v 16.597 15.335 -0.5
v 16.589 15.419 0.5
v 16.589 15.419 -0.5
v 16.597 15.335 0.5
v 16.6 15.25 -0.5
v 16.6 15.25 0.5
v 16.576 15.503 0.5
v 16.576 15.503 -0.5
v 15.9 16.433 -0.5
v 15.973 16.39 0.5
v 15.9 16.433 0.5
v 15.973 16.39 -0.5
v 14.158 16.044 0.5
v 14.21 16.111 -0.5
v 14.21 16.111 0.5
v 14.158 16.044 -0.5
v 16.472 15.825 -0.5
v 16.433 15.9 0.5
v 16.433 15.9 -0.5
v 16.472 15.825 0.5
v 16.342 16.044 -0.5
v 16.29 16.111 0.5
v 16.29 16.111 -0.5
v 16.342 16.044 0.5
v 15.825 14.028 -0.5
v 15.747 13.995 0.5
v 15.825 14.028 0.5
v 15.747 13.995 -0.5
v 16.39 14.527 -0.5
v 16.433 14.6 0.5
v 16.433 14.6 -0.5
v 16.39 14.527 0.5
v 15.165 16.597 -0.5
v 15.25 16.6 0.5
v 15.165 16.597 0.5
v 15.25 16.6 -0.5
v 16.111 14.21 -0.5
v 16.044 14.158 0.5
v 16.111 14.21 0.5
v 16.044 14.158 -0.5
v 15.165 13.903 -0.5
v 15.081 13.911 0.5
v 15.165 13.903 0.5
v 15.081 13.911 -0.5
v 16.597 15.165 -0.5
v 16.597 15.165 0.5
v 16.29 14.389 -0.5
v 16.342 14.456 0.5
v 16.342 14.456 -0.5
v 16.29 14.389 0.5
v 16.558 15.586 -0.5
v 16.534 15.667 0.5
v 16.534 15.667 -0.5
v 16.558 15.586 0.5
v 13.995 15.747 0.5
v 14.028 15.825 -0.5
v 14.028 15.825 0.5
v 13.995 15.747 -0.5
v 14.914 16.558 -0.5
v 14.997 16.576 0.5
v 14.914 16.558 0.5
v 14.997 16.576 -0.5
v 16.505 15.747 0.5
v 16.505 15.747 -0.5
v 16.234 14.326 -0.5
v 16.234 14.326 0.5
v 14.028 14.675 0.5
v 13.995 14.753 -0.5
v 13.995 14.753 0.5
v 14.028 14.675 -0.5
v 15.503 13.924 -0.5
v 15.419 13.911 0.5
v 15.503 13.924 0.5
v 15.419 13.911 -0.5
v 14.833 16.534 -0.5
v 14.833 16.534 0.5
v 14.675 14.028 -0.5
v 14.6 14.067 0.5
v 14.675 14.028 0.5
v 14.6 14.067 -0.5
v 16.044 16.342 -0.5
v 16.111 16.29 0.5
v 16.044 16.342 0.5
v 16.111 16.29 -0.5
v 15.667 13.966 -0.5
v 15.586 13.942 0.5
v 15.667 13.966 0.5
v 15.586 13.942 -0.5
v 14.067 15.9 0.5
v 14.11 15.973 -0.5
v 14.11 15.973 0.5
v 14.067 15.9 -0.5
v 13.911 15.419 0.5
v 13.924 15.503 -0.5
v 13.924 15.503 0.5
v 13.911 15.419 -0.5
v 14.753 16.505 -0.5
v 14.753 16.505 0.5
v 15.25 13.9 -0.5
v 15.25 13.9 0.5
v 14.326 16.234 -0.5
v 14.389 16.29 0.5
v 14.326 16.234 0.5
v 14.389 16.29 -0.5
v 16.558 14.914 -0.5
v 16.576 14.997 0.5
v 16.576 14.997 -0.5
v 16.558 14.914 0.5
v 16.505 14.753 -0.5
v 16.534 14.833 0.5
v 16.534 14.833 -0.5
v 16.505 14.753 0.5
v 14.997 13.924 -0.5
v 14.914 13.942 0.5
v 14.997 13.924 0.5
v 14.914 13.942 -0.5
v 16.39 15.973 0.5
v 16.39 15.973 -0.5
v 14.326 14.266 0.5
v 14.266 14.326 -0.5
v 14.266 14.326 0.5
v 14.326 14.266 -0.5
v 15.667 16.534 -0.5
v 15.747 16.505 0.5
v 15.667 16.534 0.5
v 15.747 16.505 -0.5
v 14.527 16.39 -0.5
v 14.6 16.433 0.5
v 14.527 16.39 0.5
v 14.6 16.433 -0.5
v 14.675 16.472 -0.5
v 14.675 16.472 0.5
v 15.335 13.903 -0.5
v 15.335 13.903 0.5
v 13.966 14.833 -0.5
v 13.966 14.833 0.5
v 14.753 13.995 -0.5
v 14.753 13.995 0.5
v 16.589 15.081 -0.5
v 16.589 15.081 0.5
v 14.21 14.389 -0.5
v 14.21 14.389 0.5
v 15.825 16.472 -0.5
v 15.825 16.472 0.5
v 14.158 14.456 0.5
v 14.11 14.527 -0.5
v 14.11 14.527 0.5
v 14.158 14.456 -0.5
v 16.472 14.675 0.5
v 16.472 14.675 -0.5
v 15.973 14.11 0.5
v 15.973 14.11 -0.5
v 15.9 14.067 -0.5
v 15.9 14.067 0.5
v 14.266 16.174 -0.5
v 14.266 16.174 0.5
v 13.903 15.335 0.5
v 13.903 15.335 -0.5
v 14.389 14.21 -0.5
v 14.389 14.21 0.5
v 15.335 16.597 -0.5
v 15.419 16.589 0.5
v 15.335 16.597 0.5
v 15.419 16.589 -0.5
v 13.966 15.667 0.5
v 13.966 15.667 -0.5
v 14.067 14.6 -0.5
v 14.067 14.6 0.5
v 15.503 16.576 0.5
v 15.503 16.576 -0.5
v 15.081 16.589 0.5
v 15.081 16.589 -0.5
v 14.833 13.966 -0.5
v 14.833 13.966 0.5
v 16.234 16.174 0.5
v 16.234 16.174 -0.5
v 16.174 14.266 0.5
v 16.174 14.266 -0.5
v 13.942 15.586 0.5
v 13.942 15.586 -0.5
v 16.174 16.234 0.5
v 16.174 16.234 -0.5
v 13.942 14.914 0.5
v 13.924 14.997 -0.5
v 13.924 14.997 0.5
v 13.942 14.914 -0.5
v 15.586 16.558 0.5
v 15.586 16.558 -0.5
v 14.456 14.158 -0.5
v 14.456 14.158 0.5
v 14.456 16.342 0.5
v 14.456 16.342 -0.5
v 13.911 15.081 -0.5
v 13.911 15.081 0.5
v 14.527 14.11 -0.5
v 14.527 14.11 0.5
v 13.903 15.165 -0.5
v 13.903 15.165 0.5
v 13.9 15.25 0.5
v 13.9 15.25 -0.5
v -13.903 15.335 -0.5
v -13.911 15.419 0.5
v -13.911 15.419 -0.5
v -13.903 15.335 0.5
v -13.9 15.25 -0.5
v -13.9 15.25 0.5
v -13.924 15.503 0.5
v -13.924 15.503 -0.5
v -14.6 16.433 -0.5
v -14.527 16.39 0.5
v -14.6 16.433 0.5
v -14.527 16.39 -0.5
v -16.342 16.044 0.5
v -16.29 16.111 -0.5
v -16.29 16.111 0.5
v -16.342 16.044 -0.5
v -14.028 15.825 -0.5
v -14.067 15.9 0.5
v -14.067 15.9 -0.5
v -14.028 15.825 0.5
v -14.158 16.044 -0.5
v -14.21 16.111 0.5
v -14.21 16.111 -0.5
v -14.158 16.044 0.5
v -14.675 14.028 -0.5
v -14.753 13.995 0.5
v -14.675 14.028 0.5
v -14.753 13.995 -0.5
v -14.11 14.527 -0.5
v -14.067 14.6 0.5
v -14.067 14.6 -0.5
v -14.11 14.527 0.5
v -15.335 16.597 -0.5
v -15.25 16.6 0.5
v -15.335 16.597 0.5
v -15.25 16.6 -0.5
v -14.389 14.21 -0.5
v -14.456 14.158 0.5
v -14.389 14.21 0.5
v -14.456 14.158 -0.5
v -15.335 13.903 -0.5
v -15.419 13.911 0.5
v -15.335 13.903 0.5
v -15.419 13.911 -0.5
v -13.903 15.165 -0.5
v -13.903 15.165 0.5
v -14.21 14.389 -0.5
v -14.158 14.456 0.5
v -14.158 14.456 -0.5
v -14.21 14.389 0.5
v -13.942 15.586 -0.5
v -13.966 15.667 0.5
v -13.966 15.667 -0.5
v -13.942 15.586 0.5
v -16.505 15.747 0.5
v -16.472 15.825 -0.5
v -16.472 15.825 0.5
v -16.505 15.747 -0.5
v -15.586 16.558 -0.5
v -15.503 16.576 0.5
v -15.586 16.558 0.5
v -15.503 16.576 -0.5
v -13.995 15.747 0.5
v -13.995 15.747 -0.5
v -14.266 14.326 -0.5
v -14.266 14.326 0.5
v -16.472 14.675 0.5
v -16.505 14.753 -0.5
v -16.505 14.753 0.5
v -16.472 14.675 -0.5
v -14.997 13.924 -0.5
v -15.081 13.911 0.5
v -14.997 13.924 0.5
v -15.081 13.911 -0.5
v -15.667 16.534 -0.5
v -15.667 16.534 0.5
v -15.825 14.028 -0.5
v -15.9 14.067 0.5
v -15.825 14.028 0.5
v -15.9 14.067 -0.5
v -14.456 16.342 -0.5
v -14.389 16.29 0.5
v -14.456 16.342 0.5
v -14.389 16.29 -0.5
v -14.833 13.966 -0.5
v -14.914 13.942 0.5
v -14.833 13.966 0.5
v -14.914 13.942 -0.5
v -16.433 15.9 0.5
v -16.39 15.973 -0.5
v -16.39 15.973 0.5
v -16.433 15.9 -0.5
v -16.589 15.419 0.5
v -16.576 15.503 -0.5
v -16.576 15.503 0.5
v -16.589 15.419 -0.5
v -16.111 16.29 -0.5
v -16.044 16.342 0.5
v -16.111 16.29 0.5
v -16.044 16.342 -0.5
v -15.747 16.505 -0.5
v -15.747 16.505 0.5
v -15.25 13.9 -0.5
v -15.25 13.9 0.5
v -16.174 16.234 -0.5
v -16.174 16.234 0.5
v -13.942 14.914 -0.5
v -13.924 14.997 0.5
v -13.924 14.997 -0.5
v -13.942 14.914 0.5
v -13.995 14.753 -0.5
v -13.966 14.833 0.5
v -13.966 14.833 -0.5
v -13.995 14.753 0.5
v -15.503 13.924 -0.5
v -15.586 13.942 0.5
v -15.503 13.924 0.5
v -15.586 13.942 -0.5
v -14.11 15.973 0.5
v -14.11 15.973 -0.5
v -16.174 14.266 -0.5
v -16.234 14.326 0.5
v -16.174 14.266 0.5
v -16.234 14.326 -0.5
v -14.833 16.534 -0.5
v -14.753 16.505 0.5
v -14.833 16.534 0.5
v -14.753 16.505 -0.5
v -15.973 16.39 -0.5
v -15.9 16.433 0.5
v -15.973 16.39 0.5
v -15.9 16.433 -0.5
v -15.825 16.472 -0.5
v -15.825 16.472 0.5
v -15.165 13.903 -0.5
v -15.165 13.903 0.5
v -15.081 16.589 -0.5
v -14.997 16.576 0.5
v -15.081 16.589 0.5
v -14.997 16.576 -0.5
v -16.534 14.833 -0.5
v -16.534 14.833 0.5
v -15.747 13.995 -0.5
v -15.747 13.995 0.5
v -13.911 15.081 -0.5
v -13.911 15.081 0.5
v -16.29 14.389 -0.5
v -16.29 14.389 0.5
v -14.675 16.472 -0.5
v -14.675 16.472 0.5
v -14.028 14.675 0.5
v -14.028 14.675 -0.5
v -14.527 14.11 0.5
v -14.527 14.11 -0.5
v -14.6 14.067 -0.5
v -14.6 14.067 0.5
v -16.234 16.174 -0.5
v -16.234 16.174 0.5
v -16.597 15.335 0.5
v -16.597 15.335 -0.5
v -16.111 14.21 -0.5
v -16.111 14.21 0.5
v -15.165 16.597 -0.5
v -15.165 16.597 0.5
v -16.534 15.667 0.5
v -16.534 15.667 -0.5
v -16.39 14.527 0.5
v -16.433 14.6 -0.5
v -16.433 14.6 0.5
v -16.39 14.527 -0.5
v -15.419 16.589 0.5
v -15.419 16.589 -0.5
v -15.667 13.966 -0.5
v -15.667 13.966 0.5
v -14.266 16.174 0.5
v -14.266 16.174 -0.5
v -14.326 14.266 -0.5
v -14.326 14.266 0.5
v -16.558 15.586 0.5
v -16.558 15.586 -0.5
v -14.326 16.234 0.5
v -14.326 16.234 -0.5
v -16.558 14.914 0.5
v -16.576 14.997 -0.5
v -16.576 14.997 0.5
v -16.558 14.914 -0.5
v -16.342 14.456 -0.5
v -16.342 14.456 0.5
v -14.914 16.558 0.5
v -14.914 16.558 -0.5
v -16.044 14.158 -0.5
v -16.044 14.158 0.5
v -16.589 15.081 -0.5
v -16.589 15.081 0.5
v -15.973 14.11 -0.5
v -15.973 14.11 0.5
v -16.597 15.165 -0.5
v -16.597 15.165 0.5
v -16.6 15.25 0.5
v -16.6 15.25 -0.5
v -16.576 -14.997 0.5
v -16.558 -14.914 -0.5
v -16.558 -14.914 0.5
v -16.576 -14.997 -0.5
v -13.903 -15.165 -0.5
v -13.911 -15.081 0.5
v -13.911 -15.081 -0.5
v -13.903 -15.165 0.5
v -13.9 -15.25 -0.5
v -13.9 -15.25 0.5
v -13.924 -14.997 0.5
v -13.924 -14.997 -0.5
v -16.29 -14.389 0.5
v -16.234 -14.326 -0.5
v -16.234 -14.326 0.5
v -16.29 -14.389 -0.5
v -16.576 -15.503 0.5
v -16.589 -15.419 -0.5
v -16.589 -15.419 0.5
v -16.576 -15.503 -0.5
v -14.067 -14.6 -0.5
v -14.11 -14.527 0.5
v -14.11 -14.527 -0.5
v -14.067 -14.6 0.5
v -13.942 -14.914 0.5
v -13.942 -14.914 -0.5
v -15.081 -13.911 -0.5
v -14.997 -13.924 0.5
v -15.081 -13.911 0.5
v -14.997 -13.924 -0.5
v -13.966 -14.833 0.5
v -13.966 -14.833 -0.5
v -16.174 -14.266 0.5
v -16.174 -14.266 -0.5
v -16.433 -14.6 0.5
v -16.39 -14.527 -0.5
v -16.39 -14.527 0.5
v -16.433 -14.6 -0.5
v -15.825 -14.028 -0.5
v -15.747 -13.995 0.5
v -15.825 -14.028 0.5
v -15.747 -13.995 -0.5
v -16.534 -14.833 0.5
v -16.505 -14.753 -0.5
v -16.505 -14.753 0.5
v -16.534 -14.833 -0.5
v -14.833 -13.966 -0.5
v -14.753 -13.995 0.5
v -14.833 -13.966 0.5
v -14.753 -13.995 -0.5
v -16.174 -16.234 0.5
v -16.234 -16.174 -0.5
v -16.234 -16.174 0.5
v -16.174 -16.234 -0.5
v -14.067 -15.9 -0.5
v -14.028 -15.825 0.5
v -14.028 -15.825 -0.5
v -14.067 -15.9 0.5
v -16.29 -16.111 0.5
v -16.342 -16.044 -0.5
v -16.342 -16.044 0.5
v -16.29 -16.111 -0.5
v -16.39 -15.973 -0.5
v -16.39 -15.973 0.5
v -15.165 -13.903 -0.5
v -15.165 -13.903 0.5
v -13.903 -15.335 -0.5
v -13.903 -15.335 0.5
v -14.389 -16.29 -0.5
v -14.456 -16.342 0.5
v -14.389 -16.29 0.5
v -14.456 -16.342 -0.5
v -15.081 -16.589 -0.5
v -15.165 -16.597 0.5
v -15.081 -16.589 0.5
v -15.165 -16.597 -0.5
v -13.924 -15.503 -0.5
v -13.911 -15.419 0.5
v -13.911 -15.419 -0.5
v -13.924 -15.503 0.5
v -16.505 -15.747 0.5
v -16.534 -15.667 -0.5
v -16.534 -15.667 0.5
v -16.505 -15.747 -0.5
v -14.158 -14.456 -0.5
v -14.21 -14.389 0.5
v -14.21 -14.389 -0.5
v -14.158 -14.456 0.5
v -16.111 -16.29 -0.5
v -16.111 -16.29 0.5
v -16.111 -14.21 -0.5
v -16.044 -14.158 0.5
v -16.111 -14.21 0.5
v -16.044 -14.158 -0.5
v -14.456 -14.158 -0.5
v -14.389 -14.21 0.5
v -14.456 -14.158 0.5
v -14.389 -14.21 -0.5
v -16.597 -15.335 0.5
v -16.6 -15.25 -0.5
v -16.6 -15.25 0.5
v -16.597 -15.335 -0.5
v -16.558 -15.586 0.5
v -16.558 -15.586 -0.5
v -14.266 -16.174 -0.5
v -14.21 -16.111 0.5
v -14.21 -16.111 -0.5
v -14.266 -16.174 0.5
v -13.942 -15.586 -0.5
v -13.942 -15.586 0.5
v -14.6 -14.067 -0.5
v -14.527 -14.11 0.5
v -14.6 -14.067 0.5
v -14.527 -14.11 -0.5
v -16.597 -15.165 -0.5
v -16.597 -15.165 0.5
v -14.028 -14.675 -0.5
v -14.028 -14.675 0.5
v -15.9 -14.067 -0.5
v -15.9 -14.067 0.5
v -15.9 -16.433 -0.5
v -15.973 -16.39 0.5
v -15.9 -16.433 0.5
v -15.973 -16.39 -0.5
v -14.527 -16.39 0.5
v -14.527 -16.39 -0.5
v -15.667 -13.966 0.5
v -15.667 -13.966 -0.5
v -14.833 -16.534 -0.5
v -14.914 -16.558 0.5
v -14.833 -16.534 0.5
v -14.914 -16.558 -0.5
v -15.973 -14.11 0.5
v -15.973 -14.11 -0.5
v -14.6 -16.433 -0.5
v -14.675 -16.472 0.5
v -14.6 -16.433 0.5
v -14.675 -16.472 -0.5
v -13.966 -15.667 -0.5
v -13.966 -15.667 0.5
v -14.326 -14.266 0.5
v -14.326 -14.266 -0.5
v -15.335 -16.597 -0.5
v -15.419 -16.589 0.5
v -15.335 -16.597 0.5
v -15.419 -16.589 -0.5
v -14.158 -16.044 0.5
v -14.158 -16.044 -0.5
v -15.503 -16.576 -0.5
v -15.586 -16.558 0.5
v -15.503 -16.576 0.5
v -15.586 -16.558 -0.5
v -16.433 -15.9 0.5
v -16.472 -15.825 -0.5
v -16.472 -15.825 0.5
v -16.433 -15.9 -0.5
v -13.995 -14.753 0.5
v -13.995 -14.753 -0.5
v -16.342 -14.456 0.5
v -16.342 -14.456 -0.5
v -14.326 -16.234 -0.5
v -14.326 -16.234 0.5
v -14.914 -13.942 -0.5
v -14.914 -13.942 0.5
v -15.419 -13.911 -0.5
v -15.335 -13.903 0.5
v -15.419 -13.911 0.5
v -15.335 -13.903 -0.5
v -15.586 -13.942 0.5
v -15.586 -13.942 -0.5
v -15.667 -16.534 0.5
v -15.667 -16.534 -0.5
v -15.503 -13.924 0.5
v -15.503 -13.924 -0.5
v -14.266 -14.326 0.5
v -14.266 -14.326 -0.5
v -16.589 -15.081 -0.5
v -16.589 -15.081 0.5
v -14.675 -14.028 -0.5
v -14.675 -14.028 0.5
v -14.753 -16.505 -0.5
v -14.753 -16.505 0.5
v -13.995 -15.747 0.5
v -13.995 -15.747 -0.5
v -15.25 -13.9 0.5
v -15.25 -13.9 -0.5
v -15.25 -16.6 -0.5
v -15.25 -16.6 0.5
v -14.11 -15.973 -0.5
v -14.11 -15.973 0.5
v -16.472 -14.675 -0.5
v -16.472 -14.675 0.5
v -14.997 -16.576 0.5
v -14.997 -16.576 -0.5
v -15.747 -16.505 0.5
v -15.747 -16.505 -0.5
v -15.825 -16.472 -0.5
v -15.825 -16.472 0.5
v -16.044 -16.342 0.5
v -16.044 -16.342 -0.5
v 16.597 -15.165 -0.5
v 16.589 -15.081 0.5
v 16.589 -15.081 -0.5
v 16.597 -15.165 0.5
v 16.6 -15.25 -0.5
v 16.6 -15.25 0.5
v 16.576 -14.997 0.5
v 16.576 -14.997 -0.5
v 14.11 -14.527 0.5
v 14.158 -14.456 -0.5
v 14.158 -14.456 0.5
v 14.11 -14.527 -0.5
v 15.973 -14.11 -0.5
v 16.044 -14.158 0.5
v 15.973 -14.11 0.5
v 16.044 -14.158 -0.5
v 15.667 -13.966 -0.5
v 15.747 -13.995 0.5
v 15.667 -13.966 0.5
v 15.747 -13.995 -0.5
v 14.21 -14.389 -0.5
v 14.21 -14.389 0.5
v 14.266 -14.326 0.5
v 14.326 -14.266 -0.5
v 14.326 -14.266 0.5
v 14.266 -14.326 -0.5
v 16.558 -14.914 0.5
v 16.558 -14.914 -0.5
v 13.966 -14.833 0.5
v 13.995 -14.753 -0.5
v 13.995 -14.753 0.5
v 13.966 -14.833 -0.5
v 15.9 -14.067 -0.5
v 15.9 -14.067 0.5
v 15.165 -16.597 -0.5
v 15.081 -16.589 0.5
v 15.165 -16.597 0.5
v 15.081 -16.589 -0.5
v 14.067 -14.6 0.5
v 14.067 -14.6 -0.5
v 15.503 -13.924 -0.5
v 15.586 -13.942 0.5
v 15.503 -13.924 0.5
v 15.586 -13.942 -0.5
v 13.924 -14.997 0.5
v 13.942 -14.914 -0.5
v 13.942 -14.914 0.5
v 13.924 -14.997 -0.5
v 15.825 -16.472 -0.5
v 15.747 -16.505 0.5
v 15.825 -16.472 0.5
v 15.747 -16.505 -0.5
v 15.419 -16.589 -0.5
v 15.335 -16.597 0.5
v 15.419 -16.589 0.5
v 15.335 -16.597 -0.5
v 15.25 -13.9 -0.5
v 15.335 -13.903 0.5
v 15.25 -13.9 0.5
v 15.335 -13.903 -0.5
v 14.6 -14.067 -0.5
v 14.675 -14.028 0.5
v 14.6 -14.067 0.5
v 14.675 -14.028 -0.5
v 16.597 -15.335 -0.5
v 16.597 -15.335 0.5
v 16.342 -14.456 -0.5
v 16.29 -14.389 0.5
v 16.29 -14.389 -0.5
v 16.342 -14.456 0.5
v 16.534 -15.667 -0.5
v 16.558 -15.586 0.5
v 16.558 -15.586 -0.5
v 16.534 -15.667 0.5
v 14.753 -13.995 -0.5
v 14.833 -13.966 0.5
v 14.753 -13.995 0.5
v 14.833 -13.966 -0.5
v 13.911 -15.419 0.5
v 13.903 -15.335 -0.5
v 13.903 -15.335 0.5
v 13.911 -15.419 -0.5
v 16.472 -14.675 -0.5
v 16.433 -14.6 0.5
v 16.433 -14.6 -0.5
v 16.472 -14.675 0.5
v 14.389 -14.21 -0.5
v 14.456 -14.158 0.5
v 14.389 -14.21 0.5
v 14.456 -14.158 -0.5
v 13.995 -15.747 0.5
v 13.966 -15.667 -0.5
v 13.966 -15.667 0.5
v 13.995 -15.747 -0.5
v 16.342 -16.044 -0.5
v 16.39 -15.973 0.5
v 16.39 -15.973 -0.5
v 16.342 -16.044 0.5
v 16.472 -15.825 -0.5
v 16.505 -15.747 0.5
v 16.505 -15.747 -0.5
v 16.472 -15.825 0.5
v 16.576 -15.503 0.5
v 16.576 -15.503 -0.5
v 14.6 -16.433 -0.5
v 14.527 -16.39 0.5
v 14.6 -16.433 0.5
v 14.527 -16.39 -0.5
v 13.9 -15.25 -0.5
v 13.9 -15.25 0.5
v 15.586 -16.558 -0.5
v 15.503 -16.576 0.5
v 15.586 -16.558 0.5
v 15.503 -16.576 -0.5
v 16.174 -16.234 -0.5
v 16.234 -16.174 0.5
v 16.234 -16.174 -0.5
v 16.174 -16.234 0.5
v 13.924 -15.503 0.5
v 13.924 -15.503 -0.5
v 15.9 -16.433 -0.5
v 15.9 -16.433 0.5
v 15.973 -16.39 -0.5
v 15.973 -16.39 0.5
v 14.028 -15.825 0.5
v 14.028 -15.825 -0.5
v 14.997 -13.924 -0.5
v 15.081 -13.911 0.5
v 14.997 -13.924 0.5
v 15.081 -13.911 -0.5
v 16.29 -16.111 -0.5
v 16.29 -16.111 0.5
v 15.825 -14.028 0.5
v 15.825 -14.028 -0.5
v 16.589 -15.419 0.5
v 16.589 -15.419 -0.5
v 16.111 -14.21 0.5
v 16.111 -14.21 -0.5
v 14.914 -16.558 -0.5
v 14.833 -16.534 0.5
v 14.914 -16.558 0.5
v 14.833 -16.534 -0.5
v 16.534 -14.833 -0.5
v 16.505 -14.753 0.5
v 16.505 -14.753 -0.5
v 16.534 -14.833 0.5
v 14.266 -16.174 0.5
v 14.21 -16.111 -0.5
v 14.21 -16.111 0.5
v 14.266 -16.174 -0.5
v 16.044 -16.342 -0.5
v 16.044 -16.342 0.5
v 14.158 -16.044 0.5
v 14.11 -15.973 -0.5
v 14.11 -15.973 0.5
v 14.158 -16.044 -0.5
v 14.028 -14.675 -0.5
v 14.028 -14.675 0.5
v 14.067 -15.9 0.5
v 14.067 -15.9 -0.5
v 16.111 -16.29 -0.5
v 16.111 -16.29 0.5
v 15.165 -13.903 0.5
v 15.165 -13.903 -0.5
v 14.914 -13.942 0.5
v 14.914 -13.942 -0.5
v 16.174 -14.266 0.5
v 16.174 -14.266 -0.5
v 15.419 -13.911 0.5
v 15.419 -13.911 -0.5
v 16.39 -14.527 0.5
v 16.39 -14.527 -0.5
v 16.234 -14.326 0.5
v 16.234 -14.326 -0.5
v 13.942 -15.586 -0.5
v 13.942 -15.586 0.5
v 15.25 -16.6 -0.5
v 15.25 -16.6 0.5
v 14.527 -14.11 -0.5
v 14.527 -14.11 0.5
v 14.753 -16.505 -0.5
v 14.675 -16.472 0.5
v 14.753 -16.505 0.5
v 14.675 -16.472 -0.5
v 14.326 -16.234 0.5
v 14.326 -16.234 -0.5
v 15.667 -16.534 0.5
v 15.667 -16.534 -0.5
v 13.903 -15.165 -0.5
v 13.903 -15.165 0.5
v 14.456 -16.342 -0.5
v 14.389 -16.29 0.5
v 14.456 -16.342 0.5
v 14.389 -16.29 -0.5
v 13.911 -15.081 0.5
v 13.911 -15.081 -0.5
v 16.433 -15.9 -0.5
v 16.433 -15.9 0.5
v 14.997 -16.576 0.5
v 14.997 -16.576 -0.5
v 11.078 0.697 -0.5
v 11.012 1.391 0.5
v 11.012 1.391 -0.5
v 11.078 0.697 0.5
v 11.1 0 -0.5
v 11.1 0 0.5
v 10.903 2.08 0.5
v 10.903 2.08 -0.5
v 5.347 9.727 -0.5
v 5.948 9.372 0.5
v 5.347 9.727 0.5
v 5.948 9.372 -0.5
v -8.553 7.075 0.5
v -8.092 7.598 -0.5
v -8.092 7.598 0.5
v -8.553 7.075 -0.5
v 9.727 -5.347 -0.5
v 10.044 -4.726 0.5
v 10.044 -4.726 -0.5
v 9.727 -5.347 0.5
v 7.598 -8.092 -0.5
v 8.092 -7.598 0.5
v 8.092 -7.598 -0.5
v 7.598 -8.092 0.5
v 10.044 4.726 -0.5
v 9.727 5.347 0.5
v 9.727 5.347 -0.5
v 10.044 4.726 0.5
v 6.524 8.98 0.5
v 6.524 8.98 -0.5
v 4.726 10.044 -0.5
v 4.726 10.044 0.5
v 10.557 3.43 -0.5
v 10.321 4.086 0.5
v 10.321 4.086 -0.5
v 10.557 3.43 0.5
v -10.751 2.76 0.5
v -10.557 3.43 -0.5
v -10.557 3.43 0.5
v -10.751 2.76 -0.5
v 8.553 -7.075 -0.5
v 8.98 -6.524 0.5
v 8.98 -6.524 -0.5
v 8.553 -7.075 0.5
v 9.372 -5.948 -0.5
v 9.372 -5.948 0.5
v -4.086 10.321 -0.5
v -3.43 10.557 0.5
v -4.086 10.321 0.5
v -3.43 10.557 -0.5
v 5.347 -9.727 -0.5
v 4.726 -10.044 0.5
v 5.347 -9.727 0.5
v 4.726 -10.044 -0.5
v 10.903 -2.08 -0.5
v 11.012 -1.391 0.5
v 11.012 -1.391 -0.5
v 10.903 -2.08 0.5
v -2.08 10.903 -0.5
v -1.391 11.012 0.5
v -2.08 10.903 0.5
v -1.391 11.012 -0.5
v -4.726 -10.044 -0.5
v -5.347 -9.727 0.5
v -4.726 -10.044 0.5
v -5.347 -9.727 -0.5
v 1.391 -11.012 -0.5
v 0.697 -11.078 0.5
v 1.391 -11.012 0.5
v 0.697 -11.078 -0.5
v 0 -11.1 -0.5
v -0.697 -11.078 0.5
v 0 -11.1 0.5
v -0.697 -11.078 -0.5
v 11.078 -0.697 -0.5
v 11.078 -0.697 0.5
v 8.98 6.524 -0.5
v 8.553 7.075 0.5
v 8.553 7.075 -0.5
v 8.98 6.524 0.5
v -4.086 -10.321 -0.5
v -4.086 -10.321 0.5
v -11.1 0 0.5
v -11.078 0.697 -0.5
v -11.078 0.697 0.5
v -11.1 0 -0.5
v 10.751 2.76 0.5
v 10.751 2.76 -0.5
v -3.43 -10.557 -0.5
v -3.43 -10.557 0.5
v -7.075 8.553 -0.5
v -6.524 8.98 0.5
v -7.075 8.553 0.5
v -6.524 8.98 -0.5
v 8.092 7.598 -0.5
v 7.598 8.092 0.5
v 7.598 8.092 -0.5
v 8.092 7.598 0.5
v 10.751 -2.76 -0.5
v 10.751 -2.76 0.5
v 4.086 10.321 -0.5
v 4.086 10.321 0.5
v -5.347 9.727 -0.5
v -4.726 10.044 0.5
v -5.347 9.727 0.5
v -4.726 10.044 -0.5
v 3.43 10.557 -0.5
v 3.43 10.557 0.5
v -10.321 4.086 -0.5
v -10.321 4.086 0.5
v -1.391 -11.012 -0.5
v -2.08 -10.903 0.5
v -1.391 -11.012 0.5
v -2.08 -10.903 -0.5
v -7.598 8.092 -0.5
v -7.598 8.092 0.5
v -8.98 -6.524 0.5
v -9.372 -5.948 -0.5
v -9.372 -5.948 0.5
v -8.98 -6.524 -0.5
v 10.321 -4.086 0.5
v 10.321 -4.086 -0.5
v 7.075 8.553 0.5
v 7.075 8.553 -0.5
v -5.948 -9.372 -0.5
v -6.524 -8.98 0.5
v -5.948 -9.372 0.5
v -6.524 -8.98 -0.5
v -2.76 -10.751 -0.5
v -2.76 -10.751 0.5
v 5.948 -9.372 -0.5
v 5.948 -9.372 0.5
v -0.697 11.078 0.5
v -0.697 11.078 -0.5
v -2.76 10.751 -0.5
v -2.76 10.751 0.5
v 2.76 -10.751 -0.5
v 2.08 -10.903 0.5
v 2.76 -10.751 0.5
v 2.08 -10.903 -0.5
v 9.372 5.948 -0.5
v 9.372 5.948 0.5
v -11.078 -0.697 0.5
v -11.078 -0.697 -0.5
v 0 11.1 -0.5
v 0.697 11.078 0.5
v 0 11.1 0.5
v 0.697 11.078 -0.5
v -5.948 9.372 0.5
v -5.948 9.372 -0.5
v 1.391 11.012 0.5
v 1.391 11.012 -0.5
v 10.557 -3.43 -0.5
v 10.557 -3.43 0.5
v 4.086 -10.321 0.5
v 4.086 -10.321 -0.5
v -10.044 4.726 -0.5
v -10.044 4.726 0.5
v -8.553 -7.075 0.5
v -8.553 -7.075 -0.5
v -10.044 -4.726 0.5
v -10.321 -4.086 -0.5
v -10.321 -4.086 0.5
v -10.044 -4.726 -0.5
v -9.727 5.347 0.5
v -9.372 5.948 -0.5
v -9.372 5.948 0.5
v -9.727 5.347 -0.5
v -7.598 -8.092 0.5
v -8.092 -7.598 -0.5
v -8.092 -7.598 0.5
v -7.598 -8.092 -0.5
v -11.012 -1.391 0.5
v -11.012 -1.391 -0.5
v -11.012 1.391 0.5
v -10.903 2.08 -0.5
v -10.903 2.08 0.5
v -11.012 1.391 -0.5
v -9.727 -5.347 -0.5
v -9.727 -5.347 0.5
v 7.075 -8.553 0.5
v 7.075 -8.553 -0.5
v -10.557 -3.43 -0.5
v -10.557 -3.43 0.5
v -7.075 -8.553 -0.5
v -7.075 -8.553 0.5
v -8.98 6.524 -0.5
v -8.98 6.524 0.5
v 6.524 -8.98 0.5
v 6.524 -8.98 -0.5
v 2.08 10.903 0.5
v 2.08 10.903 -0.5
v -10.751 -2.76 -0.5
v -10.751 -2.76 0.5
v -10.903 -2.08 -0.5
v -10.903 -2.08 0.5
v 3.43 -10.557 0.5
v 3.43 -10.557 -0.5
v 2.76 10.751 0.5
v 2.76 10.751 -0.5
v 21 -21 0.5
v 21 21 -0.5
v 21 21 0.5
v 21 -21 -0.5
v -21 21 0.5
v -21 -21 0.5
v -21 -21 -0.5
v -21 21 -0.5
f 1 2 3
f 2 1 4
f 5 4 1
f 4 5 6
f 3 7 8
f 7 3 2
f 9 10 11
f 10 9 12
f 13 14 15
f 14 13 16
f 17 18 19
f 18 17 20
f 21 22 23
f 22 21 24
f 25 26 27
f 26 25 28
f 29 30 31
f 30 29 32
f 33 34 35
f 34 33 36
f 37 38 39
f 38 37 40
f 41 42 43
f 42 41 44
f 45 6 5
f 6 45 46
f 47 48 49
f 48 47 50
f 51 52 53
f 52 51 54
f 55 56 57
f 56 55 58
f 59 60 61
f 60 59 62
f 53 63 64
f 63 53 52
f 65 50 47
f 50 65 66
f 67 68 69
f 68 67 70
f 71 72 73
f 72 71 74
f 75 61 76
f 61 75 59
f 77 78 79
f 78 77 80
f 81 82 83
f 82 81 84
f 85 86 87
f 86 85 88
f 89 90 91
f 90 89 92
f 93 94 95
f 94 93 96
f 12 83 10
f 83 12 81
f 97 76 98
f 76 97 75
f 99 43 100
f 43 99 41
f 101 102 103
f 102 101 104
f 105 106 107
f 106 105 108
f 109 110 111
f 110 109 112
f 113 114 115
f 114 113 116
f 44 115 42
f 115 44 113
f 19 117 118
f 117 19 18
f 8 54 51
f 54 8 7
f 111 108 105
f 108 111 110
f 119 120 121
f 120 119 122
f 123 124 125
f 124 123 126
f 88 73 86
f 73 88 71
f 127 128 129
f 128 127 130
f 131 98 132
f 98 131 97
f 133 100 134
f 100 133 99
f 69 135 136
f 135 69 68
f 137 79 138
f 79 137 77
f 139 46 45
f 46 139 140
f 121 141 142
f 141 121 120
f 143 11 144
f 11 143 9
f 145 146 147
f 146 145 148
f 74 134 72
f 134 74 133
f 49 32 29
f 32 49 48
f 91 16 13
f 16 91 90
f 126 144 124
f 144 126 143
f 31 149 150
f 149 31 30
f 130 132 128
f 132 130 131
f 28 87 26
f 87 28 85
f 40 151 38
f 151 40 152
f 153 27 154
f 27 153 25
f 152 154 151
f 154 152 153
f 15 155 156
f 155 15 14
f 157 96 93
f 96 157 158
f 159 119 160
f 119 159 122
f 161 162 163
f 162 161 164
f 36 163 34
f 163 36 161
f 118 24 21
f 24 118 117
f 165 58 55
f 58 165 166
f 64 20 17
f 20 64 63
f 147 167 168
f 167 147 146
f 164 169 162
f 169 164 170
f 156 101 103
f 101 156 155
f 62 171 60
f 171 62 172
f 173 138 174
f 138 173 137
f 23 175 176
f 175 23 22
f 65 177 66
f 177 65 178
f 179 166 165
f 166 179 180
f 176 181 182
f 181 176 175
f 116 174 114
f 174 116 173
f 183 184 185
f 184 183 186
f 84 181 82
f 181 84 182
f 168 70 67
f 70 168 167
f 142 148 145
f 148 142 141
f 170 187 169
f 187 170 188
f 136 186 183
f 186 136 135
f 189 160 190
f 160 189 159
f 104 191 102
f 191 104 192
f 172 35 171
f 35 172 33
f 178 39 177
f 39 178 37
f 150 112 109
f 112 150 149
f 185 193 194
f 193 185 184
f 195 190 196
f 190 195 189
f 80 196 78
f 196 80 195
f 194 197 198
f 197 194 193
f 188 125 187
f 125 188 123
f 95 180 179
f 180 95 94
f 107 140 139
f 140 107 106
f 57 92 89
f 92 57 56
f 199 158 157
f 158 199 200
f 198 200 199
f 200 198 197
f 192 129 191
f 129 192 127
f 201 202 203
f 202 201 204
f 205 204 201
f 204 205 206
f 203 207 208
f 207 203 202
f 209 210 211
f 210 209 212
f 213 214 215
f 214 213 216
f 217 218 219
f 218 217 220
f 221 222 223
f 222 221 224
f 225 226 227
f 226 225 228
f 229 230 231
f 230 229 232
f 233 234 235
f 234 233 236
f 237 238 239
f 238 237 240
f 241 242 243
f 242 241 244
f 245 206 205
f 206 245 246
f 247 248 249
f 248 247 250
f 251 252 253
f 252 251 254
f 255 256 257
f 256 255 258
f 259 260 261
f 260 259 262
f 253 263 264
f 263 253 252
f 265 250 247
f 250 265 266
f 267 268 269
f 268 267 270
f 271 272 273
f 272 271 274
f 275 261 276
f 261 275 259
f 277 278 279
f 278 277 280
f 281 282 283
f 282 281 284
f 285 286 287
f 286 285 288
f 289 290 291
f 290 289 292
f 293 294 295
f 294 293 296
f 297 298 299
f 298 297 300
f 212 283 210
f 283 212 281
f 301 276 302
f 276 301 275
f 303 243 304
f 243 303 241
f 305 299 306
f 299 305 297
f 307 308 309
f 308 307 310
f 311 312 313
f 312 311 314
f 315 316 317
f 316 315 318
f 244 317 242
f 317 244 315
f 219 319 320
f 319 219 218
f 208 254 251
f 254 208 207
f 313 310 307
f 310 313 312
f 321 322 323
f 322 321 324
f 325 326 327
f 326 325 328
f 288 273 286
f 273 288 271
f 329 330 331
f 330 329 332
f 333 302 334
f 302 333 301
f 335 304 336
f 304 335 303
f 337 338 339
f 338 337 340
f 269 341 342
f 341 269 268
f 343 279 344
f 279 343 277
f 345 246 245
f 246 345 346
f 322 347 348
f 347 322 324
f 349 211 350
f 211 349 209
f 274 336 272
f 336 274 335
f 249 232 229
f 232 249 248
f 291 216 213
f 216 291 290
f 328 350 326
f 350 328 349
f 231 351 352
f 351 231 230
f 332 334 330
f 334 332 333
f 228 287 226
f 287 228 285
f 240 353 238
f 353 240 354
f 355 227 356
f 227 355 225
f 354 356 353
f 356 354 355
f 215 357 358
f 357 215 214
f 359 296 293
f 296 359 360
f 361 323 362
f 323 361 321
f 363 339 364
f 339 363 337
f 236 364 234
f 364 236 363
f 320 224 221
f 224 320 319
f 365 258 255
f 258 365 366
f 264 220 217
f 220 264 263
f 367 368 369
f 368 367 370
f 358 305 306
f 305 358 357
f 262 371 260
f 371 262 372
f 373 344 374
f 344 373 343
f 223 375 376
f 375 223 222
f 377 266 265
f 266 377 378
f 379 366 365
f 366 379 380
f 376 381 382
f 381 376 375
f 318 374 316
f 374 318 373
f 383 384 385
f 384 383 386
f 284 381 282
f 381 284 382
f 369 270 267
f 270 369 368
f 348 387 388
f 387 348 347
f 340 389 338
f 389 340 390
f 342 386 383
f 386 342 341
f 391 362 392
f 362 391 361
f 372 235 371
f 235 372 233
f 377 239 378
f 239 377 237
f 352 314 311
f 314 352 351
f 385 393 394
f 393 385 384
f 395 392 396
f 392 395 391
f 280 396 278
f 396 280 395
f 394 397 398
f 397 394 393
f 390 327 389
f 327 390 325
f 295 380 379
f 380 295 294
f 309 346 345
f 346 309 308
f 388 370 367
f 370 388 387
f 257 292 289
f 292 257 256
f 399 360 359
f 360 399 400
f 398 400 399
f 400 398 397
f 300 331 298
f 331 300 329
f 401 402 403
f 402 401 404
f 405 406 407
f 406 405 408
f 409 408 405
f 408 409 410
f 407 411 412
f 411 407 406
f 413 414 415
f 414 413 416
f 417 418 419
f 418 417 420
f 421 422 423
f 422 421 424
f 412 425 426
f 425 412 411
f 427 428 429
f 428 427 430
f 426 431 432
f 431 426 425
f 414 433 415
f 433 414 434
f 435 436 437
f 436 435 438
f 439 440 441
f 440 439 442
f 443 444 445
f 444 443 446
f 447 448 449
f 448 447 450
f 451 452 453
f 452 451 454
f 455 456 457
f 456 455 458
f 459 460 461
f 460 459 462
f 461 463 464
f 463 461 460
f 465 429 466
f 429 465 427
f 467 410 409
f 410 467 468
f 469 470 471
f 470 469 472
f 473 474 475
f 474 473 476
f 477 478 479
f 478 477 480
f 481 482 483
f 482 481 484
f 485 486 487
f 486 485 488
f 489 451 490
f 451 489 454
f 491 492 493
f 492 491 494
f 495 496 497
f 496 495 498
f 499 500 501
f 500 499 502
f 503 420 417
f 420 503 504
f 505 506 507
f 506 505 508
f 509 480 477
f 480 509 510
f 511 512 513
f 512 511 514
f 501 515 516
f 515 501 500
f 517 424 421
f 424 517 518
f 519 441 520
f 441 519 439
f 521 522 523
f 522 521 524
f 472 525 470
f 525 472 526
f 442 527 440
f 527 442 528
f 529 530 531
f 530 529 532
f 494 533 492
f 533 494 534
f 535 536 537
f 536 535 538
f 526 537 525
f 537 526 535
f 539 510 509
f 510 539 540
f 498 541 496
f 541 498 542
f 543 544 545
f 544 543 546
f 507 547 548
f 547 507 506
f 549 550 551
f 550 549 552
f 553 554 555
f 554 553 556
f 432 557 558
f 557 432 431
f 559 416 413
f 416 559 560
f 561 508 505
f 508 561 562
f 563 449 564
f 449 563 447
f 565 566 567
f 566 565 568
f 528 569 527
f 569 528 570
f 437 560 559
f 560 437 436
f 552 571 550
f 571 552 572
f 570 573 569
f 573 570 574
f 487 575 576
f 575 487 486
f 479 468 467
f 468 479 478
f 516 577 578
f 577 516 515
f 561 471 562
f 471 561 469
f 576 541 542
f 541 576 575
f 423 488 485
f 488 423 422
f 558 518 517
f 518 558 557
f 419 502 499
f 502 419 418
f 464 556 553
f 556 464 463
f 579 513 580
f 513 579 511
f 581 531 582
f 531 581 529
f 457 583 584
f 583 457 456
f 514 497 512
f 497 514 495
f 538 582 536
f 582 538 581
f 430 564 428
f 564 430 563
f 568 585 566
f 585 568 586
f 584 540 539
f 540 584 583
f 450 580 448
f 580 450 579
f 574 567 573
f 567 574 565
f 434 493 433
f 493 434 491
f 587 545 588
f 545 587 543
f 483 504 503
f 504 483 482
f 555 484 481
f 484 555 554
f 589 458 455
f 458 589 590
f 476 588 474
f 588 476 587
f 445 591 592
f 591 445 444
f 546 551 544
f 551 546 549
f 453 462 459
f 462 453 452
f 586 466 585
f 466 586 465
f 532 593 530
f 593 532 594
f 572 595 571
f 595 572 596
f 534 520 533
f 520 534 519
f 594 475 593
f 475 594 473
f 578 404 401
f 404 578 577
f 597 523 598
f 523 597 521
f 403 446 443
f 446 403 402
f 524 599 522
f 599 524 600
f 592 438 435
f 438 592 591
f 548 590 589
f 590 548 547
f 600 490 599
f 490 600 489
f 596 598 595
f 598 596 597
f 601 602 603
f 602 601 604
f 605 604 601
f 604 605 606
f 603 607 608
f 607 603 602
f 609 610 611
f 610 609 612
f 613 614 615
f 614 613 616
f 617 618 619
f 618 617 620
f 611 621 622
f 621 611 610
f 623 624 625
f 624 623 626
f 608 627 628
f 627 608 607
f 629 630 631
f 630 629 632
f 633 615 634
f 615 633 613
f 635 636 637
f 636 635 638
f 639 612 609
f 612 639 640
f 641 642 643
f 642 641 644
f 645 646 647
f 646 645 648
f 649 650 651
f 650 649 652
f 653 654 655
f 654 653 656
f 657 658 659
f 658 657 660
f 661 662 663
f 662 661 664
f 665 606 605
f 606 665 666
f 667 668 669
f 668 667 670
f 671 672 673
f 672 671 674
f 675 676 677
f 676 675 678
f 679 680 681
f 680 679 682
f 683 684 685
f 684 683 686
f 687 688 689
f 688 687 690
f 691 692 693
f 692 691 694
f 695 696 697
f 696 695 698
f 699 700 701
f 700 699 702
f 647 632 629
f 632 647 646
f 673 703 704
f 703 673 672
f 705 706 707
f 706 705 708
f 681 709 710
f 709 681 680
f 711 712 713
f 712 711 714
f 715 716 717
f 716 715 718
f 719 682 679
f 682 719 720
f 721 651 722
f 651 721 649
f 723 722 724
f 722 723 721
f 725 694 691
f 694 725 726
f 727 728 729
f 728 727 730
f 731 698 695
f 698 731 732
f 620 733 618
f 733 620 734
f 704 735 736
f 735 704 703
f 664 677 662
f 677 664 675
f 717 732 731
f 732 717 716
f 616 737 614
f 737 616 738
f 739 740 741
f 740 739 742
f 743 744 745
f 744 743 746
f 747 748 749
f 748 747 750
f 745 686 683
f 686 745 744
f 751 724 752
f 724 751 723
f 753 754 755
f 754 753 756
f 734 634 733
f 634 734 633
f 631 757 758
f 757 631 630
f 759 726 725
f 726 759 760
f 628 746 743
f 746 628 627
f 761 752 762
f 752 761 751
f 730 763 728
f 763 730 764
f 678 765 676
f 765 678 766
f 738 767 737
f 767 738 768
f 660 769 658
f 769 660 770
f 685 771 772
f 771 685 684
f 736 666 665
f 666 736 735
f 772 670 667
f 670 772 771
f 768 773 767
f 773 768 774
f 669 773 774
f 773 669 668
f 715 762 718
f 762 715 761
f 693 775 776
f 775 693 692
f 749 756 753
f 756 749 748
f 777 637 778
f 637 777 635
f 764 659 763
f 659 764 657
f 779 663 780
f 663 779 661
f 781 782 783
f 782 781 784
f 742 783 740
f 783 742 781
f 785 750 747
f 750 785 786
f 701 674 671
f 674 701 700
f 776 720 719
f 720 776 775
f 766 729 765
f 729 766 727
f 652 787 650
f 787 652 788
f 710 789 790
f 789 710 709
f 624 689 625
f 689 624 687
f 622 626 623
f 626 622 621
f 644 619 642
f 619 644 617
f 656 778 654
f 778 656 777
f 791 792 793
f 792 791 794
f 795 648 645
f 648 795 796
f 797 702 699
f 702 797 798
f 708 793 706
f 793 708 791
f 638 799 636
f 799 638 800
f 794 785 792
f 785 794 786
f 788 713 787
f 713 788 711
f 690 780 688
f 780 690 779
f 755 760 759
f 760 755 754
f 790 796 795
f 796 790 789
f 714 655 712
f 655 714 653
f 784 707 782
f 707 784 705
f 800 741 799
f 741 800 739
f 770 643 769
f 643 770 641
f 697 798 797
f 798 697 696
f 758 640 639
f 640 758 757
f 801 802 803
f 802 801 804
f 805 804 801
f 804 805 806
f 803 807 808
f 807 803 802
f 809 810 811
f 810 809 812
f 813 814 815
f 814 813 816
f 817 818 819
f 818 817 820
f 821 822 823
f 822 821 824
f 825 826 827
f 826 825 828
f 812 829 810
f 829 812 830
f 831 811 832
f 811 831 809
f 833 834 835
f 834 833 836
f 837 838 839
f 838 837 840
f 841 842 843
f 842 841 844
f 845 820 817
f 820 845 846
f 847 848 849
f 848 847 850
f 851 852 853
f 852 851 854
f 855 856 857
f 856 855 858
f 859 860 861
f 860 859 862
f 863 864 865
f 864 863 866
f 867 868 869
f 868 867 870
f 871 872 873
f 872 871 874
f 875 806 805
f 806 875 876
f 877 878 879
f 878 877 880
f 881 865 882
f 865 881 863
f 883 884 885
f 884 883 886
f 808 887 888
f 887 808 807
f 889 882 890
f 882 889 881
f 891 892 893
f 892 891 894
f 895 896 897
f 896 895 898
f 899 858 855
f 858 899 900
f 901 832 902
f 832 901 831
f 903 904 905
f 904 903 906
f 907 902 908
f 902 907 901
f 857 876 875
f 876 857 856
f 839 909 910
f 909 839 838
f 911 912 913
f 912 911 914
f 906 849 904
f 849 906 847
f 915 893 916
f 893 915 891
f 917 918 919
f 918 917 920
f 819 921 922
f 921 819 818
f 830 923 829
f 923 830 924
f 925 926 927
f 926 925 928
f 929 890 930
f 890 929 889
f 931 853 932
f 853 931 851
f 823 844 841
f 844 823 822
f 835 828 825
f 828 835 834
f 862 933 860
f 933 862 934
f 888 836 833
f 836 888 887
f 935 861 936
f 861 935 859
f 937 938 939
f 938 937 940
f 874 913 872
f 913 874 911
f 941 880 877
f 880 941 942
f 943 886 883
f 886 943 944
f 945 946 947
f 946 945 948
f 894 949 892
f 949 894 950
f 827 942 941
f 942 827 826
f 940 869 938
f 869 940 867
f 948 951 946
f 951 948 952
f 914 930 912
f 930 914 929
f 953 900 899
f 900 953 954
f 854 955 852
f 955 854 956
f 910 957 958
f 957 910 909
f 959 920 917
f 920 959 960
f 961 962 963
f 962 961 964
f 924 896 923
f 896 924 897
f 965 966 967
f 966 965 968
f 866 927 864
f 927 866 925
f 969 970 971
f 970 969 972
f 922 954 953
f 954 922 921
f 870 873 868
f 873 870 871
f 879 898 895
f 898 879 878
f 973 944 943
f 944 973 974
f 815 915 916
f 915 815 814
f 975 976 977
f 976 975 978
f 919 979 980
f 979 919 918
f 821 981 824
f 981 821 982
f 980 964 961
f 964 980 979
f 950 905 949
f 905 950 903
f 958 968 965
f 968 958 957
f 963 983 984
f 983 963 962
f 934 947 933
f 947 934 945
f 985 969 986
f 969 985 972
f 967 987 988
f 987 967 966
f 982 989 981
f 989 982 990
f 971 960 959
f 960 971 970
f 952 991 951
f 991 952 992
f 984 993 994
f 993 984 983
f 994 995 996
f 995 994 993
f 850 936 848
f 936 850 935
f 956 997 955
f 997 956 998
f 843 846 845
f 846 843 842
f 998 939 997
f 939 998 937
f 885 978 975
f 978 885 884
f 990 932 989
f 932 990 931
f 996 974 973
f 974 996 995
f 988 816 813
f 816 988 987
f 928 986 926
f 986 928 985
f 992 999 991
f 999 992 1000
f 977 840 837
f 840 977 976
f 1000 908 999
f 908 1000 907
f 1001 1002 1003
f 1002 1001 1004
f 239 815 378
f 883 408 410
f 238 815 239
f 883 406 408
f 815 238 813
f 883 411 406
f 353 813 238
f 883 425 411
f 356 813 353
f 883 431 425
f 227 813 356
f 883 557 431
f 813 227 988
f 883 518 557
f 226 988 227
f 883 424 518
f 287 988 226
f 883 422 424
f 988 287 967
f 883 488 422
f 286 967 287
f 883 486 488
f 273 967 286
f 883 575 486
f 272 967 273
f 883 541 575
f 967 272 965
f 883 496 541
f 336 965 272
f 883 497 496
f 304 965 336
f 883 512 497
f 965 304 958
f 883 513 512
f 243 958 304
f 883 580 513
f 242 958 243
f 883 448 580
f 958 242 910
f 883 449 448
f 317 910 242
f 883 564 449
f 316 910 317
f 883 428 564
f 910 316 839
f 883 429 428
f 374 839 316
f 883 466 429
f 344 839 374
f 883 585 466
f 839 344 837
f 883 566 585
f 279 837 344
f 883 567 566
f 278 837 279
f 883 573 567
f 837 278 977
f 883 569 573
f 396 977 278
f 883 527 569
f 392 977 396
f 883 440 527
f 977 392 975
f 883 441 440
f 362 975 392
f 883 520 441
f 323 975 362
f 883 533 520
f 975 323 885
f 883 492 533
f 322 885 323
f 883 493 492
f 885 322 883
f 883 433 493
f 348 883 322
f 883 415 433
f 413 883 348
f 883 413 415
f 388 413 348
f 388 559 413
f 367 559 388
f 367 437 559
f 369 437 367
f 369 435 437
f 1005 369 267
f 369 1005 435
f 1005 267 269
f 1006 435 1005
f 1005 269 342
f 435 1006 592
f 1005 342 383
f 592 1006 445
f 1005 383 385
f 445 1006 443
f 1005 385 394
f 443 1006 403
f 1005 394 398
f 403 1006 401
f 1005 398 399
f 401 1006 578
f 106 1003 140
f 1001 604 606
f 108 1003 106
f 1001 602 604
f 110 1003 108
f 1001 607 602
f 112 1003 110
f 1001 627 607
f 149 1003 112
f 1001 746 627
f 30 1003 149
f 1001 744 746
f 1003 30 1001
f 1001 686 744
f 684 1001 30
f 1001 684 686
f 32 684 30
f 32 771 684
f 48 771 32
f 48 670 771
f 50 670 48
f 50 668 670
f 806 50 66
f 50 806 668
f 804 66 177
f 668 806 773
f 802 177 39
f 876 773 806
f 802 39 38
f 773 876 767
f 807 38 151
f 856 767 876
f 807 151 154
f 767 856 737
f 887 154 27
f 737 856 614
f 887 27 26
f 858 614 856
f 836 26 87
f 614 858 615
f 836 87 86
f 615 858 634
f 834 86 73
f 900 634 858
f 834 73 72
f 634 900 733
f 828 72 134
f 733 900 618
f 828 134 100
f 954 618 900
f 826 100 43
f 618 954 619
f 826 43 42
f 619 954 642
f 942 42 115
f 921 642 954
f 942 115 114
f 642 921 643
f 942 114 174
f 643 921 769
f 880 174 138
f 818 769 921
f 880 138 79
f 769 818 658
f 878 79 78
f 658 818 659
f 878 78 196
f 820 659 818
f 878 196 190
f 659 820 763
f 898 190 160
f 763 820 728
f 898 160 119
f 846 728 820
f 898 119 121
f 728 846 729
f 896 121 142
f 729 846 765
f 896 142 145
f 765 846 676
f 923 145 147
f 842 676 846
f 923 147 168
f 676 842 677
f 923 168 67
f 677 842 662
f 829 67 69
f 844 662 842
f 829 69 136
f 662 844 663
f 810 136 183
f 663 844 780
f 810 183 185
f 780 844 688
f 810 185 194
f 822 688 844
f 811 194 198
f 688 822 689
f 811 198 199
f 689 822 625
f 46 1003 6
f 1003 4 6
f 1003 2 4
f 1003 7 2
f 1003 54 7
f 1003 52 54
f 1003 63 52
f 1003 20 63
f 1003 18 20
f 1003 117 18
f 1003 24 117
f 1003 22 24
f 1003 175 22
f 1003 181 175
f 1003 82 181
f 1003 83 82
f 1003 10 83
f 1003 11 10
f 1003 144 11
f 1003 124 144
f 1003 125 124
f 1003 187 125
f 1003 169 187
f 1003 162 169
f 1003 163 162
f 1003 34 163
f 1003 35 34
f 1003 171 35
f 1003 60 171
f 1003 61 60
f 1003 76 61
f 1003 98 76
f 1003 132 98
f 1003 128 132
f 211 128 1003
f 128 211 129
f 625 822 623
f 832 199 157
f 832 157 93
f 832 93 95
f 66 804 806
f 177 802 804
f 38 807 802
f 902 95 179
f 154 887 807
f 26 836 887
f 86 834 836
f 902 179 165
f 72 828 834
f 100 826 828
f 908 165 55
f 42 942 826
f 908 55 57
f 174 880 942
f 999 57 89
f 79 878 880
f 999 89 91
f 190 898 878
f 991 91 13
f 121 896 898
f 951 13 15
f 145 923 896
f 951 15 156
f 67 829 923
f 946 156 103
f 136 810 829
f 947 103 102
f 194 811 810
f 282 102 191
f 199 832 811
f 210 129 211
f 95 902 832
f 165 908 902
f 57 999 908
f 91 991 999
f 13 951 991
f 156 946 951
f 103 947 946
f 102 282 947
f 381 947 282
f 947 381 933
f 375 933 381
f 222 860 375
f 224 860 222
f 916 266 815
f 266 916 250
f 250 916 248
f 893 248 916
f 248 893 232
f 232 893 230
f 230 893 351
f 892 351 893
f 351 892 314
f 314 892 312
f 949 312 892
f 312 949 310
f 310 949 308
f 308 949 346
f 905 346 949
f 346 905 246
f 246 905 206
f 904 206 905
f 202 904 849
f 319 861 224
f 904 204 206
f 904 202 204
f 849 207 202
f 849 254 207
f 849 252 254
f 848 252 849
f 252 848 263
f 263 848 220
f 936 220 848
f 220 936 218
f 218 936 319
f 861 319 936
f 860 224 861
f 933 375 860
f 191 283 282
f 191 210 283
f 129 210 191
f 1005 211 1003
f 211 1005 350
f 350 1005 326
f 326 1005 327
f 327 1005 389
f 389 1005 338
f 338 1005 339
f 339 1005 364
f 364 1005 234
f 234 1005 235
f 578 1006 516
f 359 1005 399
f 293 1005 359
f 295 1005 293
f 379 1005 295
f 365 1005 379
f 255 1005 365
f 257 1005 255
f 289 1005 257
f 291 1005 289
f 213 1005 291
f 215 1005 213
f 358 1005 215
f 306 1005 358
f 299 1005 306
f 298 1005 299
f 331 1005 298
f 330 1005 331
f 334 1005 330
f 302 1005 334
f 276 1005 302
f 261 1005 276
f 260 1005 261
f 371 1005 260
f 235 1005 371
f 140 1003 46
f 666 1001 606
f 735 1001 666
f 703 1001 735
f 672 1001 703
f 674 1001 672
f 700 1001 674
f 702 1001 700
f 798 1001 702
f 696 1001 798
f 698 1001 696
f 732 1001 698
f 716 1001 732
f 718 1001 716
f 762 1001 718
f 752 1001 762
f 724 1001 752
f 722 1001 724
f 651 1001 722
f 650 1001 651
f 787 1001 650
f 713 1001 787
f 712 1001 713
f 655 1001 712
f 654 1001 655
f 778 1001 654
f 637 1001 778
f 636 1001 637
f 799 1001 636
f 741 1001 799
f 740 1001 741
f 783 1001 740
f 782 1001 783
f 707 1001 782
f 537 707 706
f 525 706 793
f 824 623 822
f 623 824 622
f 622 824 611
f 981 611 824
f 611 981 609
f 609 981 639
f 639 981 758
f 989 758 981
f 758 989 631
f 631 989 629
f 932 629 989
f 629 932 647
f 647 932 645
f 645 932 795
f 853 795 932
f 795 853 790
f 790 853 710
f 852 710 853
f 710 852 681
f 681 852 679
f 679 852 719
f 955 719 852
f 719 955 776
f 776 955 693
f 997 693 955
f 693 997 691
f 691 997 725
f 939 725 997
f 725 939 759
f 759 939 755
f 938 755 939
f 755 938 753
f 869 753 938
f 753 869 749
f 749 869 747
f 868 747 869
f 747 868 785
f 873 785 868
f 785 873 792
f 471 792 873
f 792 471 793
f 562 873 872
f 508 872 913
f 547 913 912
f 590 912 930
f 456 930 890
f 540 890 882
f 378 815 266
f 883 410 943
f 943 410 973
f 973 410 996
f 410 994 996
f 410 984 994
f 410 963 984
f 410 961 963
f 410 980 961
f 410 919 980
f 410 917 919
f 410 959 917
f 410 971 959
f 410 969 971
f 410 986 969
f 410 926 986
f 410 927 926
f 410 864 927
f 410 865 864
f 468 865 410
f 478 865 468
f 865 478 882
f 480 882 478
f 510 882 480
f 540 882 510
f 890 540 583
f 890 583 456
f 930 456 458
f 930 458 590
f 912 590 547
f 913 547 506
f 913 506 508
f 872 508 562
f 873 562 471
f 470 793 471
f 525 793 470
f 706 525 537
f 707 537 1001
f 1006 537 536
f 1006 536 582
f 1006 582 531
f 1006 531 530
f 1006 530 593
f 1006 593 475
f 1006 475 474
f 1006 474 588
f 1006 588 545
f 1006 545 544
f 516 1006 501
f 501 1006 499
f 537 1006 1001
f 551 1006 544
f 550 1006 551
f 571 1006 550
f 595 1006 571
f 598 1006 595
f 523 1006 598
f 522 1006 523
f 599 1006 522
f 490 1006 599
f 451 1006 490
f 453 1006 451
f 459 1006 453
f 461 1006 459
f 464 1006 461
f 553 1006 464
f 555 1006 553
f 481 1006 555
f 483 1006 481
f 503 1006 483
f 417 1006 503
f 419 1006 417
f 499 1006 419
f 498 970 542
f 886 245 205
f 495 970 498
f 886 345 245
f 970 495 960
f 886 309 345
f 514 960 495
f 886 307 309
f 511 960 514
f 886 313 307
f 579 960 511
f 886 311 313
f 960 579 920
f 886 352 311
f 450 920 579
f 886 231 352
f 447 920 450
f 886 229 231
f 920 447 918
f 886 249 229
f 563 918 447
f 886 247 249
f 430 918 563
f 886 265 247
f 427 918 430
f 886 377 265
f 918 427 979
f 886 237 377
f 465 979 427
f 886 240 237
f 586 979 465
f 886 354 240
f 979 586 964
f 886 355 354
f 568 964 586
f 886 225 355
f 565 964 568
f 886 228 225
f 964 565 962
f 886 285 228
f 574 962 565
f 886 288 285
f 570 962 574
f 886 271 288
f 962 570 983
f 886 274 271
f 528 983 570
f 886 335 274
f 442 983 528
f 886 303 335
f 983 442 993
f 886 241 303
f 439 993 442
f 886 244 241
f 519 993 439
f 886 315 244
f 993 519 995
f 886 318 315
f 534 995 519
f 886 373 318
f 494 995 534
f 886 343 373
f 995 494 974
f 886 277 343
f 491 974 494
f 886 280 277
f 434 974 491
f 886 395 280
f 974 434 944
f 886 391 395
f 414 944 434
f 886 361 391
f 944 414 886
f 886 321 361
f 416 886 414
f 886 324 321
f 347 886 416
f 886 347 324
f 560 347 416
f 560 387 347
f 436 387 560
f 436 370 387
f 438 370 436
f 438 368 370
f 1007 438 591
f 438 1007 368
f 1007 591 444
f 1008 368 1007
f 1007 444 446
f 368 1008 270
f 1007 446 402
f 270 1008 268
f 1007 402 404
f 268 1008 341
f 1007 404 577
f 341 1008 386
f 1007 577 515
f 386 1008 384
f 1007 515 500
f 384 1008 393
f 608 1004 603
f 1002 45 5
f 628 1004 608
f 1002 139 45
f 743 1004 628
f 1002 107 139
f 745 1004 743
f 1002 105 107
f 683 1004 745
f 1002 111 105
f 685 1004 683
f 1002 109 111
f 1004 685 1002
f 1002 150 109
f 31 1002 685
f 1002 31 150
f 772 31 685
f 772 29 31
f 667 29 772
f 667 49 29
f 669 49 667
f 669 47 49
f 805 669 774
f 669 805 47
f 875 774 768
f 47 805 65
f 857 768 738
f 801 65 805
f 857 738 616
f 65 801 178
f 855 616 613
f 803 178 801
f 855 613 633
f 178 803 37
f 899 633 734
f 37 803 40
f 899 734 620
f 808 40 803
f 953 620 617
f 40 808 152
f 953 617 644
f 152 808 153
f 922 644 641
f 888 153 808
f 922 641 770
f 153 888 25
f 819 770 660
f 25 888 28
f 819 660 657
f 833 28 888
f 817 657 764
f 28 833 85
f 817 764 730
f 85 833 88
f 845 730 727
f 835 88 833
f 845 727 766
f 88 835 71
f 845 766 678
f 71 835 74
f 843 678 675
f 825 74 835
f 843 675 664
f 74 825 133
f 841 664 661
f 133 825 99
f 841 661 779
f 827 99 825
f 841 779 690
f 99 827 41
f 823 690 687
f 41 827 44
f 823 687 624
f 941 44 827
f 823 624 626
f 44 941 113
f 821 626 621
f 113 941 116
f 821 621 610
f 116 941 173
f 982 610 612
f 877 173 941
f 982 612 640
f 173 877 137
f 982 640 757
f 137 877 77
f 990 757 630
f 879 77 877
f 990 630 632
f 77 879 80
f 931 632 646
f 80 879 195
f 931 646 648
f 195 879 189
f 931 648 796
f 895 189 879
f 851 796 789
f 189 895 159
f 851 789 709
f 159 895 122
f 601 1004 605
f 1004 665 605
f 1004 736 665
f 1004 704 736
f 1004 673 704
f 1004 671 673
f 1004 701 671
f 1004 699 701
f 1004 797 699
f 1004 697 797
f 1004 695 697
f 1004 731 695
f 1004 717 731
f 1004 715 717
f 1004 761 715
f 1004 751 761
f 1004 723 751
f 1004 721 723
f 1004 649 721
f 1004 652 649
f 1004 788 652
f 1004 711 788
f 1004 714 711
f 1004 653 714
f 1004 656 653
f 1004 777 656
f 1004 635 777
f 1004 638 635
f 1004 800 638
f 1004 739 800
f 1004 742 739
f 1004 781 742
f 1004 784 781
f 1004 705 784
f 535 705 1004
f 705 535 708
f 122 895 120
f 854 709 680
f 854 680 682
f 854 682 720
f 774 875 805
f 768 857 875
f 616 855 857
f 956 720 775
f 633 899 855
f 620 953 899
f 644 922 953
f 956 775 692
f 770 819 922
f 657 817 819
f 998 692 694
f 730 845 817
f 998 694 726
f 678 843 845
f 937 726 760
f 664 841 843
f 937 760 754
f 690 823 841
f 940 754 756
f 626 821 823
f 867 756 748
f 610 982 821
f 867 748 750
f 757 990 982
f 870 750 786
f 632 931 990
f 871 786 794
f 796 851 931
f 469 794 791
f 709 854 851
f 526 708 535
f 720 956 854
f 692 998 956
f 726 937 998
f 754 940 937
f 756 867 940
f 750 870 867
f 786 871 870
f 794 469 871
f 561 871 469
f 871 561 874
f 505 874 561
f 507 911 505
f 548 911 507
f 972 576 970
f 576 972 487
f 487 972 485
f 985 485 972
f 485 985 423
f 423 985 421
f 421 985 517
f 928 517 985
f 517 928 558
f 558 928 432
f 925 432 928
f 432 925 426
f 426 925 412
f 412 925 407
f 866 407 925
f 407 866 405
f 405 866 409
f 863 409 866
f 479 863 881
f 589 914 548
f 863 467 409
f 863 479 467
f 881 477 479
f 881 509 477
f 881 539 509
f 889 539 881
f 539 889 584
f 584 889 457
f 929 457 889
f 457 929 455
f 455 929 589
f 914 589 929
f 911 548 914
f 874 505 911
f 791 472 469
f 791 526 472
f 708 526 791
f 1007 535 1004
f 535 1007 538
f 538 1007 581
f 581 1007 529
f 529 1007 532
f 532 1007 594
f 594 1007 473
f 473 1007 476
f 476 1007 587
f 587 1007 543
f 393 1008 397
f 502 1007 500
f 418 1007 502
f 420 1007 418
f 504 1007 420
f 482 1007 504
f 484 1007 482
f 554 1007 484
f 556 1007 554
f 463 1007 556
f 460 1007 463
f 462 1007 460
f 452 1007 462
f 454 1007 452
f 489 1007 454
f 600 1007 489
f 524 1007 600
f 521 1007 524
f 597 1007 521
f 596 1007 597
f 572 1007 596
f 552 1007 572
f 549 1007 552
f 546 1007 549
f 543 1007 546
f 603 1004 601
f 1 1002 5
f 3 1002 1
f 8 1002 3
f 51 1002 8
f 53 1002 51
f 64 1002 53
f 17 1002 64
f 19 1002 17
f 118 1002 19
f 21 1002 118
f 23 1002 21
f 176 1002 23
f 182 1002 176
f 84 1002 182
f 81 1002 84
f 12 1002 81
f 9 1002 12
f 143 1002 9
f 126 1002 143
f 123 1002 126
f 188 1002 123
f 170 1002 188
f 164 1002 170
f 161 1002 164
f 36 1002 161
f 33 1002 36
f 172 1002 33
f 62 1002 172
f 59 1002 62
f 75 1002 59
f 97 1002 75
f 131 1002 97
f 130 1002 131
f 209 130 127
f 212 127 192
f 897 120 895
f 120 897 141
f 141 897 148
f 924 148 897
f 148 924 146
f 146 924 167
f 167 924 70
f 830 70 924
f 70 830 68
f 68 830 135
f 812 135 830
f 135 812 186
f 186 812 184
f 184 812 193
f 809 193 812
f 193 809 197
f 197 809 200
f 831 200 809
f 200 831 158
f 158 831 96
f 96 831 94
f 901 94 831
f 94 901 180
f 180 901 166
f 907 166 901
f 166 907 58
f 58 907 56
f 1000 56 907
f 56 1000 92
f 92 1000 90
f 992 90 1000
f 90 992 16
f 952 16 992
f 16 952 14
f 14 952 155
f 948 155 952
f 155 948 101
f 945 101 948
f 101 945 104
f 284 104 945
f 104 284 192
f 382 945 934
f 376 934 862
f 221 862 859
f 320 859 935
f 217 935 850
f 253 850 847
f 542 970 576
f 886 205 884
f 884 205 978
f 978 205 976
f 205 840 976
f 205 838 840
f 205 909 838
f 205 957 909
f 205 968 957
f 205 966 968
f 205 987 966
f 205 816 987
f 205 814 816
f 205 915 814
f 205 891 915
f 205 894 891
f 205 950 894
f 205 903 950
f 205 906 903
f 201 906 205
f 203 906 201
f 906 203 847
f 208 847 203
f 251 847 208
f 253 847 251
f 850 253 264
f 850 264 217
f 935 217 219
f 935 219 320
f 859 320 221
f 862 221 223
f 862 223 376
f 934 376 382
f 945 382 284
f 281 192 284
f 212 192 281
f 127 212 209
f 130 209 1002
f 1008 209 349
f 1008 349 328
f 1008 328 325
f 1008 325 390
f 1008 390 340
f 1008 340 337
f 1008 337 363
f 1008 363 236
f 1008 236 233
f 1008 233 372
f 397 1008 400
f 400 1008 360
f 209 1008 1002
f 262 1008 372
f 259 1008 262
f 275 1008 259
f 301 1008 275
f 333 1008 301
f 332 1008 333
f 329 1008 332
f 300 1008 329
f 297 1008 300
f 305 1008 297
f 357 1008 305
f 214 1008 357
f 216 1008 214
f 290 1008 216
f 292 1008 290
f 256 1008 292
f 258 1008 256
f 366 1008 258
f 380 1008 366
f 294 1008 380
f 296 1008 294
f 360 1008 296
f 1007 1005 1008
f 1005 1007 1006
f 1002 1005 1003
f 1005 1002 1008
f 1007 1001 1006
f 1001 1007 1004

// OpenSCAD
/**
 * @author ShadyFox2004
 * Simple model of a mount for a stepper motor, including clearance for the 3d printing
 */
 
clearance = 0.20;

$fn = 100;

module centerClearance() {
    cylinder(d=22+clearance, center = true, h = 2.00);
}    

module screwHole() {
    cylinder(d=2.5+clearance, center = true, h = 2.00);
}
    
SPTP = 30.50;
holeOffset = SPTP/2;

module holes() { 
        centerClearance();
        // Pitagore
        radius = sqrt(holeOffset^2 + holeOffset^2); 
        for(theta = [45:90:360]) {
            translate([cos(theta)*radius, sin(theta)*radius, 0]) {
                screwHole();
            }
        }
}
side = 42;
    
difference() { 
    cube([side, side, 1], center=true);
    holes();
}
// Cute animation for part show case
$vpr = [45+ 25*sin($t*180), 0, $t * 360];
